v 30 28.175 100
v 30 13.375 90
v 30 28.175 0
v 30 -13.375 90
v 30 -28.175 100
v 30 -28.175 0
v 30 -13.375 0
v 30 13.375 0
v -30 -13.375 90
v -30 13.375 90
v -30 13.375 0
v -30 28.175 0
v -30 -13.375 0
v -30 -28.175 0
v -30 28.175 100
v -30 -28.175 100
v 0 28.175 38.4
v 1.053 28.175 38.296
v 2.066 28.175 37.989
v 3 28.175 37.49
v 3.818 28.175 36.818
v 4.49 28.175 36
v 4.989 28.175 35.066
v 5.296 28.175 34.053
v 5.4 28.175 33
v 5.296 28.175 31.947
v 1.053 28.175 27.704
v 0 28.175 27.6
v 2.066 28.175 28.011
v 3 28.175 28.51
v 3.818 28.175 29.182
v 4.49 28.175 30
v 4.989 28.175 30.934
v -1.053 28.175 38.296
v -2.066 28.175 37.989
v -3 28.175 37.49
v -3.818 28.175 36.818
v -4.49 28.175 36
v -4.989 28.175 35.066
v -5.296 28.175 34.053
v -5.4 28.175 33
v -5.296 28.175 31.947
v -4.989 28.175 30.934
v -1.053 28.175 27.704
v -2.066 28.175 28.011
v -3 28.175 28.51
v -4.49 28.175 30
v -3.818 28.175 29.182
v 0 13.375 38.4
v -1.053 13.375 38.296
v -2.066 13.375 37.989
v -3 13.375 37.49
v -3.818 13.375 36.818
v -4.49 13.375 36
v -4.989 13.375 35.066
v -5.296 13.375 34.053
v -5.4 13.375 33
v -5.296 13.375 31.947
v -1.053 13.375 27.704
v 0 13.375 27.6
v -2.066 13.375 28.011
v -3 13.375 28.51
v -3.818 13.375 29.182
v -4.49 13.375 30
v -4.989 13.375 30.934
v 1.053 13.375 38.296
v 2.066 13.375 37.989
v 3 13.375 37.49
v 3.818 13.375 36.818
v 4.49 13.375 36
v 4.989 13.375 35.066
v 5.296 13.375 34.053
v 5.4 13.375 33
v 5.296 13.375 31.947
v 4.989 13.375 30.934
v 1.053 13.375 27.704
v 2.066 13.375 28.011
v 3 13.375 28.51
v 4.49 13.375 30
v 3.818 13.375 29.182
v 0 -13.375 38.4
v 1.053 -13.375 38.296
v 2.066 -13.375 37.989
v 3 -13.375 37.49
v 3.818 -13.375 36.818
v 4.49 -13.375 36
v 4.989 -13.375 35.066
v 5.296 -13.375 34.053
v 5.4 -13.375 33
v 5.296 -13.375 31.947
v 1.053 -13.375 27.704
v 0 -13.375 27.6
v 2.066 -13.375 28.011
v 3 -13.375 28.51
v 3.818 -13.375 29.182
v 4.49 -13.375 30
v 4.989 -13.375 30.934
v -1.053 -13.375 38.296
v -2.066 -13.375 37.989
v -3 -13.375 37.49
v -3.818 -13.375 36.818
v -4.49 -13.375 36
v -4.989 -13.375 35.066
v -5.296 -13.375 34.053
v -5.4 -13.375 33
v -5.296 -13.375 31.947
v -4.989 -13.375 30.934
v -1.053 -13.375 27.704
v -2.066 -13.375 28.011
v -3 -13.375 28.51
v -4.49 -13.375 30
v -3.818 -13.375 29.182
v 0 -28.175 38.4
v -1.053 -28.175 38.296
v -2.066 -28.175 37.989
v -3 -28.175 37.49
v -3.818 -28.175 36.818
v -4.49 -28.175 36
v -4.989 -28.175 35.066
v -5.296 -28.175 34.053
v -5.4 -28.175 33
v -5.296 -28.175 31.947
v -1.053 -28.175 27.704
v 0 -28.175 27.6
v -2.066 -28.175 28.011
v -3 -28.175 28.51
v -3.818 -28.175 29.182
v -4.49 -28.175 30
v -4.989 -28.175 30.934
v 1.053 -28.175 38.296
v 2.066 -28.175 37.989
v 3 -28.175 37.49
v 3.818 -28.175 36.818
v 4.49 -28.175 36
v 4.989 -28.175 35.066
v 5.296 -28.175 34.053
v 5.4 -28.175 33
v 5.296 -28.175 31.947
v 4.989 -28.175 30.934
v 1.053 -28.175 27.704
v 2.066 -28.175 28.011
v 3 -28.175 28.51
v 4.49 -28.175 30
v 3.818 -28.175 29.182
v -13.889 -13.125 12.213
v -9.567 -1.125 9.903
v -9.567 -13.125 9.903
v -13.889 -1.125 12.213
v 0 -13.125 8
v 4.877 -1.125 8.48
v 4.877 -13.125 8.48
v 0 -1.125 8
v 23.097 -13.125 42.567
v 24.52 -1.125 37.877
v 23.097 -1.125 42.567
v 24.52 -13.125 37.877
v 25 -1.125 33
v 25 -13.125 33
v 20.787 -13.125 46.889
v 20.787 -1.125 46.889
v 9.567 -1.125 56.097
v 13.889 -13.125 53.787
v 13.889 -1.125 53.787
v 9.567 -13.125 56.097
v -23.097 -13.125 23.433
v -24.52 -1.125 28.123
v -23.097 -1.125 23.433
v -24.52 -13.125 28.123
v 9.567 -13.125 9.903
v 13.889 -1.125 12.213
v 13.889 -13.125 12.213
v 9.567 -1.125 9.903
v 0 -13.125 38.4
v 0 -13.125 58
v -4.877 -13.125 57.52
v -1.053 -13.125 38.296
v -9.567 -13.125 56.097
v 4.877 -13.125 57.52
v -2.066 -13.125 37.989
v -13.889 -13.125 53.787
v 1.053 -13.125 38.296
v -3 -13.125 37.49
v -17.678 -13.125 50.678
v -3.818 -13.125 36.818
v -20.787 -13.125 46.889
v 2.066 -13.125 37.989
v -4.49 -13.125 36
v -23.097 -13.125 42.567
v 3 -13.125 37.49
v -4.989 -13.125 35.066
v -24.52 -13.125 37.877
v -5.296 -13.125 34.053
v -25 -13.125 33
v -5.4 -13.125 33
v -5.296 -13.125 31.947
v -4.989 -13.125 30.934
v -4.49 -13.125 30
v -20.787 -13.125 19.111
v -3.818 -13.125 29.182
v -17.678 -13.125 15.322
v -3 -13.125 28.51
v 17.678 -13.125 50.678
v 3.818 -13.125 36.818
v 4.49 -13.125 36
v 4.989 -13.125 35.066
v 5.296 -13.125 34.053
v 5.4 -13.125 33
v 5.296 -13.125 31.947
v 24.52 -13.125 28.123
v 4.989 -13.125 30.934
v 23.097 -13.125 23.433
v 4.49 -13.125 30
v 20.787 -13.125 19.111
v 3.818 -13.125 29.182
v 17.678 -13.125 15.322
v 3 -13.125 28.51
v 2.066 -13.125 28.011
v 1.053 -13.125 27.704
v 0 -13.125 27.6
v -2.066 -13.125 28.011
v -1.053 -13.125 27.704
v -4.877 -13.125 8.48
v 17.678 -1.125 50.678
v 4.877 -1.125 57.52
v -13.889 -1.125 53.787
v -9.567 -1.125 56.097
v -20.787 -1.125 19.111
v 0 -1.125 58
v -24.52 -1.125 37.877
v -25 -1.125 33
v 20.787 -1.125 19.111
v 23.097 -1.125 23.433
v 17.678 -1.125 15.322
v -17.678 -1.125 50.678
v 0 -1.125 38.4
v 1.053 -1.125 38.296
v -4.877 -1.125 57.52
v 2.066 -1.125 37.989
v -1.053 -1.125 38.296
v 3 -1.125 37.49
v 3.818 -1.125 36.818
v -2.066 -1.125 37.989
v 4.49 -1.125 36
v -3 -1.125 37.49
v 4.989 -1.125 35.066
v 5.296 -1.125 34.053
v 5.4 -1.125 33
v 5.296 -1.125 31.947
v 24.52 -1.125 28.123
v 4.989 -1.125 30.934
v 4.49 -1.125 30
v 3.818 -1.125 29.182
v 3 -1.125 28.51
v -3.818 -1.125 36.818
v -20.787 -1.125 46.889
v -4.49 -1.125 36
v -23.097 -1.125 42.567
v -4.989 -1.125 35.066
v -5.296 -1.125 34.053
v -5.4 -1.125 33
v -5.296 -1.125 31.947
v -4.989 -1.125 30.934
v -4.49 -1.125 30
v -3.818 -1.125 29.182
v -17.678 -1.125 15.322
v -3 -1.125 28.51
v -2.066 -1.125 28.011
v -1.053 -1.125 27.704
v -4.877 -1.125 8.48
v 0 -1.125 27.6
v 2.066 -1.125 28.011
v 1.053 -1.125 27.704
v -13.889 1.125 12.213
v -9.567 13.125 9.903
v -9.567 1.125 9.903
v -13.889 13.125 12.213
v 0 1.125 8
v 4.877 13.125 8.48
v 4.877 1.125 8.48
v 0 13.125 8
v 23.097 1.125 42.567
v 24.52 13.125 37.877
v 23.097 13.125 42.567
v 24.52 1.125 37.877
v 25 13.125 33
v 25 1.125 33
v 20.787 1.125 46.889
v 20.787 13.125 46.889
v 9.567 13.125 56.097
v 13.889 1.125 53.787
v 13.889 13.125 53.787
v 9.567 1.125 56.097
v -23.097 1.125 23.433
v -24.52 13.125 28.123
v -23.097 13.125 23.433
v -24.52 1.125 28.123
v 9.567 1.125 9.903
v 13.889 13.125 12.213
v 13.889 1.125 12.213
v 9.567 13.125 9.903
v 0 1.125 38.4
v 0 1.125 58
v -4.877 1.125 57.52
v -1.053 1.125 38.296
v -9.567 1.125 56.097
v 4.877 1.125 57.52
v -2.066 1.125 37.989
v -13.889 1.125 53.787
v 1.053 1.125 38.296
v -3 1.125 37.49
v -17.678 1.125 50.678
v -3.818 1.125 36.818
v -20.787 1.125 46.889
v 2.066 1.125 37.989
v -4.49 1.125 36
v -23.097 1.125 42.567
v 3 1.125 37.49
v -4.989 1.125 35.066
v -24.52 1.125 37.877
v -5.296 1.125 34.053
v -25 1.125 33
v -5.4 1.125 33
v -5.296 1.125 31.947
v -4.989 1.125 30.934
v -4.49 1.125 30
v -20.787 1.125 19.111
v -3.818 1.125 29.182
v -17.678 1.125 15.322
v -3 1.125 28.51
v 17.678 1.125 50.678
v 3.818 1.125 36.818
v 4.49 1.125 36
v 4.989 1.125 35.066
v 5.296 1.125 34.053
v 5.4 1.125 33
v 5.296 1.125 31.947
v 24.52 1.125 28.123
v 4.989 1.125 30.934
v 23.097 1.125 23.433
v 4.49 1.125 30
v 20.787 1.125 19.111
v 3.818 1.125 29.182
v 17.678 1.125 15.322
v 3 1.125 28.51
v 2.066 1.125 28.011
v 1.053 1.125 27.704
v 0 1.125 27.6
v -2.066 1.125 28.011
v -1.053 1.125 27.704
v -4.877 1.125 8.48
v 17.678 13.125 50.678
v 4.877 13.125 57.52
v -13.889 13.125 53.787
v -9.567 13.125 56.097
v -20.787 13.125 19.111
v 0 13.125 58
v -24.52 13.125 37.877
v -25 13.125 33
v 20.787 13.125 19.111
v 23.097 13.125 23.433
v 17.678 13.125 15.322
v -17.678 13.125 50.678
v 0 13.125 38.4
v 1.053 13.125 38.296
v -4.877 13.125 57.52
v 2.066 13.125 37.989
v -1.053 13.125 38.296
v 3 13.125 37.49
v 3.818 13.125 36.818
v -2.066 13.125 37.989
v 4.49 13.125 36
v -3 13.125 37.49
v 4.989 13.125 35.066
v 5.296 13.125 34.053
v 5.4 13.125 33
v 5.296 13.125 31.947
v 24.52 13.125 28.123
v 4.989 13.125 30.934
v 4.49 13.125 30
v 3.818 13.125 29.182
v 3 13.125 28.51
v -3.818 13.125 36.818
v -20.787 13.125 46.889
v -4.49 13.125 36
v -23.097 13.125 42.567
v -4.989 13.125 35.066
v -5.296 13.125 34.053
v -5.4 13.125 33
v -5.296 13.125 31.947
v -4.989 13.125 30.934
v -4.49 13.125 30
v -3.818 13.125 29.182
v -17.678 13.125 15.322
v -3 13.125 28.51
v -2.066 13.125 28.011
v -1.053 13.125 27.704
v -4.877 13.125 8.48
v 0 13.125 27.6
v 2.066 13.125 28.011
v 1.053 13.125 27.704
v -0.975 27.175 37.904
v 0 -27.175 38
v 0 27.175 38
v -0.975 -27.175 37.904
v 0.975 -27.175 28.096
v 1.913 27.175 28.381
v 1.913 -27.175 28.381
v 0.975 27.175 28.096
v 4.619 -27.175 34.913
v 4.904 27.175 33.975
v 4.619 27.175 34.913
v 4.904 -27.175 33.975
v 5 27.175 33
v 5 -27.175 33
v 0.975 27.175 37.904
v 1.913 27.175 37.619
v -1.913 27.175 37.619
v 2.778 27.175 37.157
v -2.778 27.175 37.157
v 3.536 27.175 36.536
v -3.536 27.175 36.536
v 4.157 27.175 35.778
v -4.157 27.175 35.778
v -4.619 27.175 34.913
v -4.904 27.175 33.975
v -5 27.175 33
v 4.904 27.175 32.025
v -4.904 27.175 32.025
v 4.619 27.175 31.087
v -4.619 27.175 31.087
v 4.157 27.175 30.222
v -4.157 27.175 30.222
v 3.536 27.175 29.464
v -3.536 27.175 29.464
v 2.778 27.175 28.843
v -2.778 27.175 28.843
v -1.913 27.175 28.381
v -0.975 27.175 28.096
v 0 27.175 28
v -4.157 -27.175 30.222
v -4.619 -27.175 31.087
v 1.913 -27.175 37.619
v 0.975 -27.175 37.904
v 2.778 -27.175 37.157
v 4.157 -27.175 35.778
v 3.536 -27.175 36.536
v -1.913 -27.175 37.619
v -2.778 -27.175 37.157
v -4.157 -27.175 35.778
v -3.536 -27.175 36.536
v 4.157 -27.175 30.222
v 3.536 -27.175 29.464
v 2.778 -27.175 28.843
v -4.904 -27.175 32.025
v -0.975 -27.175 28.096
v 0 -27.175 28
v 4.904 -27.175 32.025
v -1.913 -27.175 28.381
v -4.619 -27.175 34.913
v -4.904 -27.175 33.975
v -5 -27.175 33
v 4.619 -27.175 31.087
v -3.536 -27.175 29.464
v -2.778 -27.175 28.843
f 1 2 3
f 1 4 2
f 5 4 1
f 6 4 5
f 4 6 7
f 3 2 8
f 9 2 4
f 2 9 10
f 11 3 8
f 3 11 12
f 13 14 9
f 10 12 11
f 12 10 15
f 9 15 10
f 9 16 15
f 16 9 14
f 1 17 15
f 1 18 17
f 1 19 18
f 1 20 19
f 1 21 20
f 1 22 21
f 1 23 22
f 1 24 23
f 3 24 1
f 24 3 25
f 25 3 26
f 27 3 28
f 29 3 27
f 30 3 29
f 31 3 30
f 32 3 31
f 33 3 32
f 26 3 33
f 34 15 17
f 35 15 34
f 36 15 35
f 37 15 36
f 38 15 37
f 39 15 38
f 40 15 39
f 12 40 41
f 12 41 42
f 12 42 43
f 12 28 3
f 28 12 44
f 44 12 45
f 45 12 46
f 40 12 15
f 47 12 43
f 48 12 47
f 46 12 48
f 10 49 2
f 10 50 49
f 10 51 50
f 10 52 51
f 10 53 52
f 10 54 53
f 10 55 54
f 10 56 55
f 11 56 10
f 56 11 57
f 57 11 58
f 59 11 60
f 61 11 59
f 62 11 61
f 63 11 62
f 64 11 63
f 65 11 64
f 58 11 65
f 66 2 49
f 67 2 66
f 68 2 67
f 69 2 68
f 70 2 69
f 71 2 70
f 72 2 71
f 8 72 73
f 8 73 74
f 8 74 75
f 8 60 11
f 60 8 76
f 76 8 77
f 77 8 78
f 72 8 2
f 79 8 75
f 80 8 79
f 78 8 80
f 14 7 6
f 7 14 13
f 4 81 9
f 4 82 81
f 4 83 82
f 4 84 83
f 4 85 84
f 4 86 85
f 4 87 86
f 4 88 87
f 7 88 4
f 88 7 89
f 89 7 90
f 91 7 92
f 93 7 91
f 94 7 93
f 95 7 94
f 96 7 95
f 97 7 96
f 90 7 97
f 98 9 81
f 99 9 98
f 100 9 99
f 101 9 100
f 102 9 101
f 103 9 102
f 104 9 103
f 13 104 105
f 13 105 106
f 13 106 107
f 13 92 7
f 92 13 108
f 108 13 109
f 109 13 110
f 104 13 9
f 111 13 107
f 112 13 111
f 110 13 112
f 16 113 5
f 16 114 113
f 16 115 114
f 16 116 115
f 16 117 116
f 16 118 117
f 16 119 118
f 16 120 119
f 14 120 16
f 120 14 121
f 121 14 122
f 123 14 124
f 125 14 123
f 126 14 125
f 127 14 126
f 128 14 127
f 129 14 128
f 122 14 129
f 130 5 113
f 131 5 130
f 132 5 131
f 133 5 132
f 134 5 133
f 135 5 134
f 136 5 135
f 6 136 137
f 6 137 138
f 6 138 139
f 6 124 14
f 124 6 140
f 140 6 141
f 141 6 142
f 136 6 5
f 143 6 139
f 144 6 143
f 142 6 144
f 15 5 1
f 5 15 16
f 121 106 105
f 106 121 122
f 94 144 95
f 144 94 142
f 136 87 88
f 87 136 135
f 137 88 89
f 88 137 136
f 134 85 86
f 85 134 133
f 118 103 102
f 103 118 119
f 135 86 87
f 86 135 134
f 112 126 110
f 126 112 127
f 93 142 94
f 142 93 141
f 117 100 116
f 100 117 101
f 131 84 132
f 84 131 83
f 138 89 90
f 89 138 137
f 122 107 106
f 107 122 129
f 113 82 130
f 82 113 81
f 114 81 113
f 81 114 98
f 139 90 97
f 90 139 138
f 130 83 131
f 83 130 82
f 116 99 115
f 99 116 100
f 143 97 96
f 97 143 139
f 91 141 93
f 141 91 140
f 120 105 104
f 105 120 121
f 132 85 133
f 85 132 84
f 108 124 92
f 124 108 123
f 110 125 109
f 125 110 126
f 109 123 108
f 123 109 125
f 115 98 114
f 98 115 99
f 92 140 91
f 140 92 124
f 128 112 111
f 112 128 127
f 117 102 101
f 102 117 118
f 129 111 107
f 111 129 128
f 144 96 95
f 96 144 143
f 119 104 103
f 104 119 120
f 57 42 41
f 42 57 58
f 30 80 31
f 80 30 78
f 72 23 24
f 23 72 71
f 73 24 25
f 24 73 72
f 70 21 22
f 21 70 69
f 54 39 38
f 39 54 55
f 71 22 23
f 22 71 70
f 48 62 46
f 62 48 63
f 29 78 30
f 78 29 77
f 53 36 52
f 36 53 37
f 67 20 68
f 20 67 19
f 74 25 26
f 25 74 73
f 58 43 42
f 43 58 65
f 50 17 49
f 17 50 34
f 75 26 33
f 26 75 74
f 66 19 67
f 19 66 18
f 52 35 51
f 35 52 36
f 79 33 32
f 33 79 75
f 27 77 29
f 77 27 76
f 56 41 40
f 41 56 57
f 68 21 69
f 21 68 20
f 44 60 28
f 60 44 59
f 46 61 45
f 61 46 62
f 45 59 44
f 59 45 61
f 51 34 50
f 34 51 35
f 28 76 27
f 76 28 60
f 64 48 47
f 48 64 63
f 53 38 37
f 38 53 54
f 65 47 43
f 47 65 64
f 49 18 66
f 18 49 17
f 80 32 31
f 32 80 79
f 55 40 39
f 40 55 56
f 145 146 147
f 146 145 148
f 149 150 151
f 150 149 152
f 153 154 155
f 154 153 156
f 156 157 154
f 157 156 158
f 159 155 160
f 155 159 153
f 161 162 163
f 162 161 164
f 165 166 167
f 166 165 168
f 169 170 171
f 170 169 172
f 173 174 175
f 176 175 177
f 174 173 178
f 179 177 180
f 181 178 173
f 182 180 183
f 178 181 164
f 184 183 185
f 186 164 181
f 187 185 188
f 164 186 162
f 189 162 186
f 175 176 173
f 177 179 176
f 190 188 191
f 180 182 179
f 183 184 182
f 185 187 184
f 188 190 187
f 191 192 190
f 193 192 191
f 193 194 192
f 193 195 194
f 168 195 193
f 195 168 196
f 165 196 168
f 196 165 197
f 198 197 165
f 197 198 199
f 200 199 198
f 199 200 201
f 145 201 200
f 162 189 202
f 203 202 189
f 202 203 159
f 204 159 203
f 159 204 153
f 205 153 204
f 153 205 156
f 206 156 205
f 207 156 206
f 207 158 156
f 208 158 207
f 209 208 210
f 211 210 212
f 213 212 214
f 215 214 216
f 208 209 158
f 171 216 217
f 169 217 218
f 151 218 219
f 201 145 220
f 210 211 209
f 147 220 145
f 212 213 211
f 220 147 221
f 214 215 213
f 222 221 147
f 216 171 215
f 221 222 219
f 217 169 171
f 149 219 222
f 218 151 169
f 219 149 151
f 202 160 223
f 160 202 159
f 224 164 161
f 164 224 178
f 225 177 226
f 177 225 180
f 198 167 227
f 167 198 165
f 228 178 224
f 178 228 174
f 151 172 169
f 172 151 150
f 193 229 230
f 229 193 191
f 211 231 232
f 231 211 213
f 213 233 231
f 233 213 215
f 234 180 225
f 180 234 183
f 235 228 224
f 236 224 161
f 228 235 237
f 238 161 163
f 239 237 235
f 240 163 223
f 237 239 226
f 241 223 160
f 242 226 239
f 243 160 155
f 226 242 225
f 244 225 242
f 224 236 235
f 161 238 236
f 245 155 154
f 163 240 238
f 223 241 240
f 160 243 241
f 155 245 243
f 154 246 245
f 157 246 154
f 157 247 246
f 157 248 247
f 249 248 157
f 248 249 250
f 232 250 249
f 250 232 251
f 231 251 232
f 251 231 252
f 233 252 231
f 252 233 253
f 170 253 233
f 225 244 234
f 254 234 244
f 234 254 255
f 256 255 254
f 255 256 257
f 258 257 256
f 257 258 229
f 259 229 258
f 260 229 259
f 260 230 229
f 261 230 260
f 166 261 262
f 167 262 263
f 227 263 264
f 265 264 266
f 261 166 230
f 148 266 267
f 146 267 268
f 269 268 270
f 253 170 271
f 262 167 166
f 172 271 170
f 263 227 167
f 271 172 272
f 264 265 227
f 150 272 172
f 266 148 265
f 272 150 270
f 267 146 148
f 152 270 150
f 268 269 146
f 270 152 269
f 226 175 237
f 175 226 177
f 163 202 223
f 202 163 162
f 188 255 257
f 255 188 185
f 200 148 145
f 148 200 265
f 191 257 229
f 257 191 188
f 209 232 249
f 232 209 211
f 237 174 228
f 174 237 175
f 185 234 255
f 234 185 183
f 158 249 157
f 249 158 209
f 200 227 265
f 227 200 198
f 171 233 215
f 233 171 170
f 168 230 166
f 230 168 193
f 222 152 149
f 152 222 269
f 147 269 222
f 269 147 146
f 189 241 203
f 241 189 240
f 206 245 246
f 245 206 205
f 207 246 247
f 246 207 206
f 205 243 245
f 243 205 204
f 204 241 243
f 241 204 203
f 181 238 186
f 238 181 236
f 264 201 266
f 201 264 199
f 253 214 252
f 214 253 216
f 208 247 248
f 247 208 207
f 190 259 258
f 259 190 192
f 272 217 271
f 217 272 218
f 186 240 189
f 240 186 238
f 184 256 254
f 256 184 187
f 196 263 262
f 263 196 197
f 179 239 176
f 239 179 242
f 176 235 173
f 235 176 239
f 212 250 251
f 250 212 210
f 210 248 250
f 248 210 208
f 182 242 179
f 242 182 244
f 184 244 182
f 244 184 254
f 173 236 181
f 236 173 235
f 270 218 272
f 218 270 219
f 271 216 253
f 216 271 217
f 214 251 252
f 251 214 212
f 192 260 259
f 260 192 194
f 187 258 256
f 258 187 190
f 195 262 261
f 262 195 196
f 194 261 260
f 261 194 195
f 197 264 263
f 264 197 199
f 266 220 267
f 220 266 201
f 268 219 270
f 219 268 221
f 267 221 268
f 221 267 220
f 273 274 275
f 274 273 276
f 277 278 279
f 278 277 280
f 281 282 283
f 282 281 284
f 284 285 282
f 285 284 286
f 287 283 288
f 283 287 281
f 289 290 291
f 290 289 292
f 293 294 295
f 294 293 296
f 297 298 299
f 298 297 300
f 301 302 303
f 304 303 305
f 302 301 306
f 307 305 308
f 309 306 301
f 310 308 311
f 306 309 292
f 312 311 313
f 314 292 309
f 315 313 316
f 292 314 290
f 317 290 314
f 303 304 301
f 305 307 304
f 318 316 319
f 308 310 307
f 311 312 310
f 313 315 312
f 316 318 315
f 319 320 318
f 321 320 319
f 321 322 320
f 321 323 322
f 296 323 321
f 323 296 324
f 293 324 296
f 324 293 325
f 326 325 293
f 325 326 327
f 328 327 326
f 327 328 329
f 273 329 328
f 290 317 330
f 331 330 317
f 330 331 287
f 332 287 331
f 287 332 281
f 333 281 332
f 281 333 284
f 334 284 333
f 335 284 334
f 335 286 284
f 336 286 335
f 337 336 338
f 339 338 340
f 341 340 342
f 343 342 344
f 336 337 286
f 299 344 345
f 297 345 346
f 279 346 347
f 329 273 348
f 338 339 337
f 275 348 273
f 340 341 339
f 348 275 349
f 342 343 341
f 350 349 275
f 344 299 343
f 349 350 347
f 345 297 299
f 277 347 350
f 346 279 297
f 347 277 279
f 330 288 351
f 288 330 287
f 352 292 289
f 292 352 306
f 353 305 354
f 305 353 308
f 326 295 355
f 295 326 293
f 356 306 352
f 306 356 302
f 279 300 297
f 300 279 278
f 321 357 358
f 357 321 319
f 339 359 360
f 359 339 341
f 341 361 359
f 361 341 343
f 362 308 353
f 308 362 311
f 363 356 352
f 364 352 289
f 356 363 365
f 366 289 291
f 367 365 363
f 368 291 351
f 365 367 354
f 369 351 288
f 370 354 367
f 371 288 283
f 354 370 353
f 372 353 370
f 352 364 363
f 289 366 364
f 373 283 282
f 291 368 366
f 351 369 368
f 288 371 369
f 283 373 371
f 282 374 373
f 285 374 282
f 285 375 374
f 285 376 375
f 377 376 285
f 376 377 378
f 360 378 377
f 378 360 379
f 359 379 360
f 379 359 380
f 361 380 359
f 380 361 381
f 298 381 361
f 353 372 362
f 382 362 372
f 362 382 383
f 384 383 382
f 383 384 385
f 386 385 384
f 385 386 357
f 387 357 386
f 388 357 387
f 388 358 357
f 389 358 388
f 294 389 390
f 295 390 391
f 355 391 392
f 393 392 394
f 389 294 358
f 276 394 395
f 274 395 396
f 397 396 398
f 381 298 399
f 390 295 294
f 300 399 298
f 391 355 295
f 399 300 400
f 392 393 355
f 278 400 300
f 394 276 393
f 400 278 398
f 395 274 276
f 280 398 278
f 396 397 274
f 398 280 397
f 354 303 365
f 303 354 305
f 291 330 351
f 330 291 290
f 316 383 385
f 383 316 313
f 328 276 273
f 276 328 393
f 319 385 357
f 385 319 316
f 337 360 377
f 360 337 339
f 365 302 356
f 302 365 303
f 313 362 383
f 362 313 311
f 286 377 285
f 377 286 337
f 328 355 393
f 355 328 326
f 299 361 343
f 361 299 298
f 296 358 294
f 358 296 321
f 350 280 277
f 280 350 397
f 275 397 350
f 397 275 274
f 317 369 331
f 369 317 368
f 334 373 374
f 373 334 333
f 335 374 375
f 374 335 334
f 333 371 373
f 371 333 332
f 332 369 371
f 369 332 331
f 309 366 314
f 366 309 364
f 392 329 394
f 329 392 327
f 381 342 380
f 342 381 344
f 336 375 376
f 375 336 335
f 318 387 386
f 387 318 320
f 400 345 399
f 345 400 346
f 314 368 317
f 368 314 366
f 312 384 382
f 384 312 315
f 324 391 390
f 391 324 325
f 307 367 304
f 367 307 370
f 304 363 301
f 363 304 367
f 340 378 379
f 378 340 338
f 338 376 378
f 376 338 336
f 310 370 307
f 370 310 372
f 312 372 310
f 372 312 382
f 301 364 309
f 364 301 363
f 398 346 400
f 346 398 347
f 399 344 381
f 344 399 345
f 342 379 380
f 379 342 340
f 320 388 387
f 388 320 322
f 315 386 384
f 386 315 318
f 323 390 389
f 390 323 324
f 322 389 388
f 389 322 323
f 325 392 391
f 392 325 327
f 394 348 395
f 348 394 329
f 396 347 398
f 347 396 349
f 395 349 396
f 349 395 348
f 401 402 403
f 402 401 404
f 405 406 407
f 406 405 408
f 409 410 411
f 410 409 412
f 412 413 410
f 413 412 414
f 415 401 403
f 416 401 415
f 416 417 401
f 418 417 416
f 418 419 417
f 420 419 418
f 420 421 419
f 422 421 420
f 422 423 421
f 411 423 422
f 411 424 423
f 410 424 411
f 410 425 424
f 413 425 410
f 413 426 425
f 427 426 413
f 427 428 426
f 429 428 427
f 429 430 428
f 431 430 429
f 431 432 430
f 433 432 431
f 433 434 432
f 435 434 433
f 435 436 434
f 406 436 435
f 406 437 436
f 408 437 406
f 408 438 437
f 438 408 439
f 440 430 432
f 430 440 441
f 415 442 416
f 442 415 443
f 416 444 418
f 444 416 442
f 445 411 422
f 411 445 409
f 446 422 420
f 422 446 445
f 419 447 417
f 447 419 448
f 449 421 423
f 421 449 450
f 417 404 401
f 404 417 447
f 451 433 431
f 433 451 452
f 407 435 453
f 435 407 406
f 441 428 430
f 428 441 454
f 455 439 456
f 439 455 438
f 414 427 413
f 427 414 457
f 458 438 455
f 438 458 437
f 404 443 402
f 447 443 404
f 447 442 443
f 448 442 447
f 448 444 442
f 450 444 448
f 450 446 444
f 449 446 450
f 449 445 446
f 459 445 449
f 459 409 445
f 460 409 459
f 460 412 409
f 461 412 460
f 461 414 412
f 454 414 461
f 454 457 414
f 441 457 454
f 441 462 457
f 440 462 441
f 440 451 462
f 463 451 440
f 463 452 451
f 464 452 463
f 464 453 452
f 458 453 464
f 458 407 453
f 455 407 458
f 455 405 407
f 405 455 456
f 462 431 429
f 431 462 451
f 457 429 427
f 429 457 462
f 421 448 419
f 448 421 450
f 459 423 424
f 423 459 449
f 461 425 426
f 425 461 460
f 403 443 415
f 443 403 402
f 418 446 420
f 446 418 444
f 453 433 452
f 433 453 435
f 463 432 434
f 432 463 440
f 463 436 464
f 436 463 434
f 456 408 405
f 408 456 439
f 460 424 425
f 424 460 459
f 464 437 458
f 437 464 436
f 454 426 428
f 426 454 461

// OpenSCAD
$fn = 32;

// ------------------------------------------------------------------------
// Trolley wheel set: wheels d50, fork 90 mm tall
// Every part is its own module, assembly() places every instance.
// ------------------------------------------------------------------------

// --- part 1 ---
module trolley_fork() {
  difference() {
    union() {
      translate([-30, 13.375, 0]) cube([60, 14.8, 90]);
      translate([-30, -28.175, 0]) cube([60, 14.8, 90]);
      translate([-30, -28.175, 90]) cube([60, 56.35, 10]);
    }
    translate([0, -20.775, 33]) rotate([90, 0, 0]) cylinder(h = 16.8, d = 10.8, center = true);
    translate([0, 20.775, 33]) rotate([90, 0, 0]) cylinder(h = 16.8, d = 10.8, center = true);
  }
}

// --- part 2 ---
module trolley_wheel() {
  difference() {
      translate([0, 0, 0]) cylinder(h = 12, d = 50);
      translate([0, 0, -1]) cylinder(h = 14, d = 10.8);
    }
}

// --- part 3 ---
module trolley_axle() {
  translate([0, 0, -27.175]) cylinder(h = 54.35, d = 10);
}

// --- assembly ---
module assembly() {
  color([0.80, 0.24, 0.20]) translate([0, 0, 0]) rotate([0, 0, 0]) trolley_fork();
  color([0.20, 0.45, 0.75]) translate([0, -1.125, 33]) rotate([90, 0, 0]) trolley_wheel();
  color([0.25, 0.62, 0.32]) translate([0, 13.125, 33]) rotate([90, 0, 0]) trolley_wheel();
  color([0.92, 0.70, 0.18]) translate([0, 0, 33]) rotate([90, 0, 0]) trolley_axle();
}

assembly();
